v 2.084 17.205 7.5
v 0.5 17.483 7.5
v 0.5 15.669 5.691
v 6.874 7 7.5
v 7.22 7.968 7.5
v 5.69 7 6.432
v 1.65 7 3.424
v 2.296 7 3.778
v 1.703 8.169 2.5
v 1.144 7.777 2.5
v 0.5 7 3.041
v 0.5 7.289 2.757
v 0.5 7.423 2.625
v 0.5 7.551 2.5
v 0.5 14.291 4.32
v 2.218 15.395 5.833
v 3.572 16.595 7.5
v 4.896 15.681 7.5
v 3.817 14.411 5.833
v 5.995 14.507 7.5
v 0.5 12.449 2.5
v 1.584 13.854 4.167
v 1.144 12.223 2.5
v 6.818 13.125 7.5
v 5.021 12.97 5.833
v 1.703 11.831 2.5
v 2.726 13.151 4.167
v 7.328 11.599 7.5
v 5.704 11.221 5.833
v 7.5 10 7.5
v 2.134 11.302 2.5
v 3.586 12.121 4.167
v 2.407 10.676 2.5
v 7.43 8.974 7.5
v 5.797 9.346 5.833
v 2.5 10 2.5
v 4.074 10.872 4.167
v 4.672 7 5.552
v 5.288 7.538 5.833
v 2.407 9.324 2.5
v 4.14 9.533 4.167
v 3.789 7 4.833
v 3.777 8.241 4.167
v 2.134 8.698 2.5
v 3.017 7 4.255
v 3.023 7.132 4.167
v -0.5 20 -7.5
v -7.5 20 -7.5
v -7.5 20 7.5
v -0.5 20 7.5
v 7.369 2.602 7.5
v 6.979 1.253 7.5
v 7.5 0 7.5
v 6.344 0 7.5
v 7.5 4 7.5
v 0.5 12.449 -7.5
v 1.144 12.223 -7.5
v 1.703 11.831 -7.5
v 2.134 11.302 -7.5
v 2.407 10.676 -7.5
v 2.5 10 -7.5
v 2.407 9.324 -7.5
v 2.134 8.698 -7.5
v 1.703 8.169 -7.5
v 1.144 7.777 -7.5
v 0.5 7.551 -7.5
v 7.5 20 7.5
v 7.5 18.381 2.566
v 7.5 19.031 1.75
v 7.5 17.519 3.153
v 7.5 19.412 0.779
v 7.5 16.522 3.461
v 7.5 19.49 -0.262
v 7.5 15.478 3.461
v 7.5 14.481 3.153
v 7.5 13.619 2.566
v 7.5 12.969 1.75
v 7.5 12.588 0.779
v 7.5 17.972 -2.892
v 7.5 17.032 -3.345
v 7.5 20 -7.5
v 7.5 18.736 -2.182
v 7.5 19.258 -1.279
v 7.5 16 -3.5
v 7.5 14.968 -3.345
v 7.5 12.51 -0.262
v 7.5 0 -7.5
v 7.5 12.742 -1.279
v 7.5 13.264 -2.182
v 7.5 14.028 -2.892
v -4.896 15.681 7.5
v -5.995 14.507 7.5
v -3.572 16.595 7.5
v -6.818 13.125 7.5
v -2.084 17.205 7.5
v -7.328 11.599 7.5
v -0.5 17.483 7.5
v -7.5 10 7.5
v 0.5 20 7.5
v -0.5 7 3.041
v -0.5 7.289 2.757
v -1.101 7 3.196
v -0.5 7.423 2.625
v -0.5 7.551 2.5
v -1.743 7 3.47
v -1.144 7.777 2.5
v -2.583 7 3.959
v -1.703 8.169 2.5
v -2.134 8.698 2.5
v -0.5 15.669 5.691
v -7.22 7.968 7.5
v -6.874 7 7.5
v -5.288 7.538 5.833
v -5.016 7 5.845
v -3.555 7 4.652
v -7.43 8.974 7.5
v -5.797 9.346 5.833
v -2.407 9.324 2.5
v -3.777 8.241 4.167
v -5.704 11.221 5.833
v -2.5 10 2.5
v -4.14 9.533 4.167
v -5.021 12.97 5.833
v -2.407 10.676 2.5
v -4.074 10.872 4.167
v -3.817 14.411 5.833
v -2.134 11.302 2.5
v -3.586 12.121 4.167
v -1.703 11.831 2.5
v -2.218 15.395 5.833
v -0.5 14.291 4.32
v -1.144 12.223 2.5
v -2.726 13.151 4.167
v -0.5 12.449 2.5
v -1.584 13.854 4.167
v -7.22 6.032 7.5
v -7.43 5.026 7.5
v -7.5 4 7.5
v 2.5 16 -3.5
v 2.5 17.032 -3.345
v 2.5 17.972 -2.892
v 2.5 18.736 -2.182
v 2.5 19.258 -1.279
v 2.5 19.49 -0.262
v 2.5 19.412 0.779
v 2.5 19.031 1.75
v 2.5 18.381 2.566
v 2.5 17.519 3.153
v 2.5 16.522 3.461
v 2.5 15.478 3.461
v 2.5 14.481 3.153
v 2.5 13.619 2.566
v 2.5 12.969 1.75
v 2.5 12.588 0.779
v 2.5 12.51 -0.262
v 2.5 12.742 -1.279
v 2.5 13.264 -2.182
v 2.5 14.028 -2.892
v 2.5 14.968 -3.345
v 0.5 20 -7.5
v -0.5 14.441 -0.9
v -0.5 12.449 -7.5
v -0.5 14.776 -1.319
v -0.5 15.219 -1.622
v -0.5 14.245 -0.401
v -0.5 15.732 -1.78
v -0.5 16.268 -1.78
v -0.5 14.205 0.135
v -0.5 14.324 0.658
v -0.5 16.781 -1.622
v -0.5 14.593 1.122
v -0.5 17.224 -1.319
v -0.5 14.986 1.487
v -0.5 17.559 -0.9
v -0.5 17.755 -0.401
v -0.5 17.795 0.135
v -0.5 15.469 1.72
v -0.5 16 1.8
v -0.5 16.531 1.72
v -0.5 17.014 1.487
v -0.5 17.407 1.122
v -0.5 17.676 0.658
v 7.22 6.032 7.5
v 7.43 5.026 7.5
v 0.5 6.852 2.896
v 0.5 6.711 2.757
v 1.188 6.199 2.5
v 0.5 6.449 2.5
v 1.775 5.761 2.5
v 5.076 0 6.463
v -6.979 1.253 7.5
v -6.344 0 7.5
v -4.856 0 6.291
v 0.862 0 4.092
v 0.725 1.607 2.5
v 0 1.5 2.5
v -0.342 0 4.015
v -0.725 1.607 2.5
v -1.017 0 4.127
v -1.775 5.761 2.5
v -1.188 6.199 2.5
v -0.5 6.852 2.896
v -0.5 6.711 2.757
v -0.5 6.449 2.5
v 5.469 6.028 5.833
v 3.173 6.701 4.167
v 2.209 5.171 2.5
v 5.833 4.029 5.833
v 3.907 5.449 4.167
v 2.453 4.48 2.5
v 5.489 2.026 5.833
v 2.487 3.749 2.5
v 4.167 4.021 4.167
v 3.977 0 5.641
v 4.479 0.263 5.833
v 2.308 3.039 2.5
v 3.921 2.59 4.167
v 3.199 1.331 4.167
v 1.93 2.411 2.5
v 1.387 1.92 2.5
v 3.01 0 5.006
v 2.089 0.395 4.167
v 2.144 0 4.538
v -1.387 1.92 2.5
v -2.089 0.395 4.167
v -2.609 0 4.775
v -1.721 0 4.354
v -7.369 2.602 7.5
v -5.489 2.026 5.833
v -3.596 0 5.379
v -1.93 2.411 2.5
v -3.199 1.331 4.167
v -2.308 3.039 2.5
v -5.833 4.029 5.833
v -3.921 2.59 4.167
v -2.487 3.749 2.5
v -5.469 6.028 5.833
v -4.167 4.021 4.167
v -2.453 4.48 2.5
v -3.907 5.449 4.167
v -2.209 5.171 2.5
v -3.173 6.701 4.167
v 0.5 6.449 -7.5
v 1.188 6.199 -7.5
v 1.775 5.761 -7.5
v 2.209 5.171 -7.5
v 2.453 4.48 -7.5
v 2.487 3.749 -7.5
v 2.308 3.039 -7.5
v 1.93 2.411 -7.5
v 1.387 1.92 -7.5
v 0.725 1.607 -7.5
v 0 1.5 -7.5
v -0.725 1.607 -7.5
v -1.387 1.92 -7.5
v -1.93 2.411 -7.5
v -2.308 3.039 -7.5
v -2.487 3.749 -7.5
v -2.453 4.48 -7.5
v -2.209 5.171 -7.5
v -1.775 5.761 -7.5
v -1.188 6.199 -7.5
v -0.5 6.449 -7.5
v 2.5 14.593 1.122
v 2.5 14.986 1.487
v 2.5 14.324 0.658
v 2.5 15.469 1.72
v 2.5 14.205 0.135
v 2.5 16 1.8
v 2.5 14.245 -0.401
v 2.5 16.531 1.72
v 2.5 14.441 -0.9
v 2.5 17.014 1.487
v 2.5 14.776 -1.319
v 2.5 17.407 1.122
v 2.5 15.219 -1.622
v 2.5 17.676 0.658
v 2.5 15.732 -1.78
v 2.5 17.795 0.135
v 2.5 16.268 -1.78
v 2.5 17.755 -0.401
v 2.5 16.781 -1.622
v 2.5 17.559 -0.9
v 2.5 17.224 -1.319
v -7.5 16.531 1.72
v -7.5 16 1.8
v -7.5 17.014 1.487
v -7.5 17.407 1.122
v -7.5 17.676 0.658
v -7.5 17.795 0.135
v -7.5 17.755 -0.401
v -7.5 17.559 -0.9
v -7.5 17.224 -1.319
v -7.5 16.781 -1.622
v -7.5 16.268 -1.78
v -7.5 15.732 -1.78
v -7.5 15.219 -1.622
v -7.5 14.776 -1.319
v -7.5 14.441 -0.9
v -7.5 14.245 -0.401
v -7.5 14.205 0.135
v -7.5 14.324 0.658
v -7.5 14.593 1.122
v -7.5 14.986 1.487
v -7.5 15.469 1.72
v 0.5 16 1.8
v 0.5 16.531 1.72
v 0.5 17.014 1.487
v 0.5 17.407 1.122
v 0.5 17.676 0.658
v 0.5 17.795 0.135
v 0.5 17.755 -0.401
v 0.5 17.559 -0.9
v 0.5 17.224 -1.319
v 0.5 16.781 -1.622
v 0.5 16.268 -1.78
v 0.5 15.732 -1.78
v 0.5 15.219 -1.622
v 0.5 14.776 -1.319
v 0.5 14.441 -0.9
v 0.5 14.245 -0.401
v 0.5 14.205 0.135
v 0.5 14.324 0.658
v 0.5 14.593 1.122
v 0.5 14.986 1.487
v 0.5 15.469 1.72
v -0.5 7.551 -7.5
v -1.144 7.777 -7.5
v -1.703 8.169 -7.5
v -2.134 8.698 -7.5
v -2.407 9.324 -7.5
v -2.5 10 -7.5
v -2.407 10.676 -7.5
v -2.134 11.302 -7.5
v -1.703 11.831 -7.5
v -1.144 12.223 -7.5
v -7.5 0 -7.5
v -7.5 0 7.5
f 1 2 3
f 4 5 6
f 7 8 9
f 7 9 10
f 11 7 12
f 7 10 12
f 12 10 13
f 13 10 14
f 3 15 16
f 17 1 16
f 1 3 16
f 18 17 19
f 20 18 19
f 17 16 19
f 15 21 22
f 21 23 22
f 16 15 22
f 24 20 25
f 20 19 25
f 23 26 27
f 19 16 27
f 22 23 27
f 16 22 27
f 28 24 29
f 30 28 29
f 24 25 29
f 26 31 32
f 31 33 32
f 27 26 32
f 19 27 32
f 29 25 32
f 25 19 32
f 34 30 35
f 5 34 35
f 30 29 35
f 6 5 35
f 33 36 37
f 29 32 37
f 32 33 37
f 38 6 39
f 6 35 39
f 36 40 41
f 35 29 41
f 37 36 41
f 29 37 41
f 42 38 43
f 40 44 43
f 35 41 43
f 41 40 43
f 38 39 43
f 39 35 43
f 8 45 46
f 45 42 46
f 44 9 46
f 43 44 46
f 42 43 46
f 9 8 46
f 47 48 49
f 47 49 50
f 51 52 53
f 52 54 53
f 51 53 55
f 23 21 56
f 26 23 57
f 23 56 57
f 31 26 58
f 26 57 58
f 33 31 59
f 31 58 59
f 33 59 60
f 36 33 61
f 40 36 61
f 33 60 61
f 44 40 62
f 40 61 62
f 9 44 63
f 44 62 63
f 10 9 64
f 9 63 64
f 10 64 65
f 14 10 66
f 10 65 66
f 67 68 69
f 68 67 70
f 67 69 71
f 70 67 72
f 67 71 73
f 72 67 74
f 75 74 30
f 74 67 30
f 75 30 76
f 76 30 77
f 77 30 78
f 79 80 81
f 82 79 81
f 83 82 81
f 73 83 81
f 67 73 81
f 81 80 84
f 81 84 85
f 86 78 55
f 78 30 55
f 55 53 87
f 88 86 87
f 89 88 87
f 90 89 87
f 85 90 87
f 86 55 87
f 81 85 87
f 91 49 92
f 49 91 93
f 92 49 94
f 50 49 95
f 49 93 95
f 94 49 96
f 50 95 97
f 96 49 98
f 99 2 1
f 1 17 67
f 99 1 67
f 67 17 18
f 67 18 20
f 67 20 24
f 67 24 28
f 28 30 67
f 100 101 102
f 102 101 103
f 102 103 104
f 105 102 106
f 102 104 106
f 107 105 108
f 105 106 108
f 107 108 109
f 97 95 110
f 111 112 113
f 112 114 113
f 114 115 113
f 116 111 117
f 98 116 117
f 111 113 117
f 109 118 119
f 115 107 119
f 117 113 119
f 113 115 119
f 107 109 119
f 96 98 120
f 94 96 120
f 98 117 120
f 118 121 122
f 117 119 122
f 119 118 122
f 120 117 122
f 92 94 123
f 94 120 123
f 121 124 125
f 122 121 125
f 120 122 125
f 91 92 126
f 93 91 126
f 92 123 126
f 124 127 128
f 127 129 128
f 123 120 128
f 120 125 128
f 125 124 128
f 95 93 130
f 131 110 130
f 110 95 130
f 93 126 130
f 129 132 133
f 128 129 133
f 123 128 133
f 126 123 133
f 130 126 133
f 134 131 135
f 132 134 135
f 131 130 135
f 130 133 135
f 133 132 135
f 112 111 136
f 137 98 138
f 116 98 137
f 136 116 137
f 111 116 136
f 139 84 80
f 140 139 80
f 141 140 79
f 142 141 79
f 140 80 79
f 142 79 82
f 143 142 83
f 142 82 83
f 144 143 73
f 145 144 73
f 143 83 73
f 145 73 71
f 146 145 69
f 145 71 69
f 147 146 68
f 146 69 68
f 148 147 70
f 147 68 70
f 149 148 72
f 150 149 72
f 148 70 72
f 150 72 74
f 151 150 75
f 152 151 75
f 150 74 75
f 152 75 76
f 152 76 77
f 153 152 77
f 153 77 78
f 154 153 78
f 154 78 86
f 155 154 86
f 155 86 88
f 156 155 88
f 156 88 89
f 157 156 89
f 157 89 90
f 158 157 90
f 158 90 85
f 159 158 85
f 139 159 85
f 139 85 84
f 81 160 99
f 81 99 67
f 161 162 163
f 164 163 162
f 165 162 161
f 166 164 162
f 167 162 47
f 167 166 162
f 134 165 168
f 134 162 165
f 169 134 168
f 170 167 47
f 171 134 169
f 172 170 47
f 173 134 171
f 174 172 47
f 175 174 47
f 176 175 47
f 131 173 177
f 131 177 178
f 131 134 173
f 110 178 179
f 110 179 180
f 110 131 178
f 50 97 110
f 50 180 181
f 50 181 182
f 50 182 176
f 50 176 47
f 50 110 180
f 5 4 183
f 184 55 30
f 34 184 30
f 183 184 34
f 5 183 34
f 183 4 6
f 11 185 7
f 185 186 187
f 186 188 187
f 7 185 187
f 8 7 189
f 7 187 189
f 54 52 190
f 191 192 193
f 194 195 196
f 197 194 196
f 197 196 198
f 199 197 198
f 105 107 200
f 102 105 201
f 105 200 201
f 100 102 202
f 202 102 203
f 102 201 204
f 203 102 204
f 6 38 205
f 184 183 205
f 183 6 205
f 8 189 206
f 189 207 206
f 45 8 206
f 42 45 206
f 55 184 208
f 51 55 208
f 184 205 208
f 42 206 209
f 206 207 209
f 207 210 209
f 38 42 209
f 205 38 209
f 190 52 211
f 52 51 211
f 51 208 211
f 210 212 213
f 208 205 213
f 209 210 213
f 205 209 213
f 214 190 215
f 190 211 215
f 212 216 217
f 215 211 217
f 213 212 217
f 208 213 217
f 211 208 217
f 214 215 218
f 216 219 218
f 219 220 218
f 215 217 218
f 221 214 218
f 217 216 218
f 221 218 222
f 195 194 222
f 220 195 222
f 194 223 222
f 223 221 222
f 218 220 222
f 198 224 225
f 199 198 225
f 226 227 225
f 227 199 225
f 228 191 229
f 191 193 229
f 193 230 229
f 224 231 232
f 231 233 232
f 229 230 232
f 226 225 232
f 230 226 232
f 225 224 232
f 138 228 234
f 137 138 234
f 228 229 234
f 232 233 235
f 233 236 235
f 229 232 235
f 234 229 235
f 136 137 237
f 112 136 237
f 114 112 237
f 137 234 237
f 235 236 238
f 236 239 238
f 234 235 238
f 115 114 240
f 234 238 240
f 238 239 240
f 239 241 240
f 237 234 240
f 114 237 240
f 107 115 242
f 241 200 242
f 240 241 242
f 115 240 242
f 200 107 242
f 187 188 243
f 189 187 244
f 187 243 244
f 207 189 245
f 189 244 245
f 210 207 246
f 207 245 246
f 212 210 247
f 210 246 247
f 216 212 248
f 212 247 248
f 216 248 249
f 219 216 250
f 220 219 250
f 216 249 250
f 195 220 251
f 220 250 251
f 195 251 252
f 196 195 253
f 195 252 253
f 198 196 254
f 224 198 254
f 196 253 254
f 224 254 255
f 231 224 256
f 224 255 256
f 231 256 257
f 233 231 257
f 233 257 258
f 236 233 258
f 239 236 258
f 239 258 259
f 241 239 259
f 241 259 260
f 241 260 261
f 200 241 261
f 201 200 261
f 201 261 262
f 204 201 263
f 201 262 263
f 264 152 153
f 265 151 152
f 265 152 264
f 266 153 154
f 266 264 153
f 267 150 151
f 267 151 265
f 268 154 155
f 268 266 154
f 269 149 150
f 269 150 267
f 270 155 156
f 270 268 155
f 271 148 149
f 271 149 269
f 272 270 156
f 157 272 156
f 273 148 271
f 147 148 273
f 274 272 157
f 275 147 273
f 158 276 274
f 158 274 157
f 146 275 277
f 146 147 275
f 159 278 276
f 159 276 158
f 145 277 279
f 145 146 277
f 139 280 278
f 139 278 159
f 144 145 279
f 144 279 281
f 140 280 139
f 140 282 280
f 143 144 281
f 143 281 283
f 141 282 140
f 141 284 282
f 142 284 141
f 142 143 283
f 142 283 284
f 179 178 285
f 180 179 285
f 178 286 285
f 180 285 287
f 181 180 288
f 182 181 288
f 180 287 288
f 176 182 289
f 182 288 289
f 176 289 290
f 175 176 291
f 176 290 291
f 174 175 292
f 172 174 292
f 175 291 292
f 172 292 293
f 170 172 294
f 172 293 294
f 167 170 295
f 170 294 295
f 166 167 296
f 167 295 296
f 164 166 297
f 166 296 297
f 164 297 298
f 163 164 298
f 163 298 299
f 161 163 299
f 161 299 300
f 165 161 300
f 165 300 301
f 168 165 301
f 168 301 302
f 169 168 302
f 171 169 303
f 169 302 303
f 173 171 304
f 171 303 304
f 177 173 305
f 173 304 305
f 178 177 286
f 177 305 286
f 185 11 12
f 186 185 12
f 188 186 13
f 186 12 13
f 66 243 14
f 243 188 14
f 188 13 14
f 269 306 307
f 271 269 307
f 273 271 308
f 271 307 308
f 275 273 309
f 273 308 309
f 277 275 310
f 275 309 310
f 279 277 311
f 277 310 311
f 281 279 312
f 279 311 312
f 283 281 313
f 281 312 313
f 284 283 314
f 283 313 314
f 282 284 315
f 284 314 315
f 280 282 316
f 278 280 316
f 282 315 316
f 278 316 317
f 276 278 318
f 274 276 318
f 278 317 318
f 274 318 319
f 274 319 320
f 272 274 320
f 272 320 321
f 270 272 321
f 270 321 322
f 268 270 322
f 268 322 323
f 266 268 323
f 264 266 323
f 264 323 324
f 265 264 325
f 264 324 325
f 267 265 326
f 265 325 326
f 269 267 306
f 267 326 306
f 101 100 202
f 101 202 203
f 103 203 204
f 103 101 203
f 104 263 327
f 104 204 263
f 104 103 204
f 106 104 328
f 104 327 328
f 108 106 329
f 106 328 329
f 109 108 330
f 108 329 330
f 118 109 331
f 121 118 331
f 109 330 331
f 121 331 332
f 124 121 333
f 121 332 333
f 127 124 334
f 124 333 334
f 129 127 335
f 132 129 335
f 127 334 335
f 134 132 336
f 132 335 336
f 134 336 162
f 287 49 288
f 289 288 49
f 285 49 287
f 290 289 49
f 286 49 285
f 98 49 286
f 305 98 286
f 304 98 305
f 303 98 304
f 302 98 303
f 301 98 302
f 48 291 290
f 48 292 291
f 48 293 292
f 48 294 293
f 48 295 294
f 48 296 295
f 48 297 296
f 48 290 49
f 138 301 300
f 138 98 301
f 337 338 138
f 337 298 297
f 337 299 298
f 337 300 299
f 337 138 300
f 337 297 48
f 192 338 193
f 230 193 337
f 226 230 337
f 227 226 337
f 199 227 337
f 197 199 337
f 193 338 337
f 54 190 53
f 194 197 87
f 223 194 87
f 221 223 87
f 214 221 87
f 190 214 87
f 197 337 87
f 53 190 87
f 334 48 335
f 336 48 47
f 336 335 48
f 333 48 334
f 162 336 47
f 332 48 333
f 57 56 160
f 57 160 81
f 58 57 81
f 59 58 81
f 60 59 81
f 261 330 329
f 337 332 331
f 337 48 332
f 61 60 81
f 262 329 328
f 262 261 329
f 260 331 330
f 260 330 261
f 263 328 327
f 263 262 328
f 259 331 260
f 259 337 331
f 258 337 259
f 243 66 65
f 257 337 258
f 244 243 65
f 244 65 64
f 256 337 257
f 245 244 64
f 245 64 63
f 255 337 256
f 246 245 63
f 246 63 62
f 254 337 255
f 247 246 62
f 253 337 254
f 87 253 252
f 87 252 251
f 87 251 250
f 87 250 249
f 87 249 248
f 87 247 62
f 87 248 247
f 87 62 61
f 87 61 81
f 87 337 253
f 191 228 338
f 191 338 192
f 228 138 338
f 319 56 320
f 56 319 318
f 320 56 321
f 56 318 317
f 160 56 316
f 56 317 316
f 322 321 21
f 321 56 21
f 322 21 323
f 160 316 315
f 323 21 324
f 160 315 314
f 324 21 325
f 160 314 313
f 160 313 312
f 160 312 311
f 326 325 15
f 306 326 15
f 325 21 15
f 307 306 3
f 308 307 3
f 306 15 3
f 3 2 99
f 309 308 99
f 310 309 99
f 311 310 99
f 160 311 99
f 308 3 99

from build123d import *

# Parameters (mm, degrees)
SZKIC1_W                                             = 15
SZKIC1_H                                             = 15
DODANIE_WYCI_GNI_CIE1_DEPTH                          = 20
POG_BIENIE_WALCOWE_POD_M3_WKR_T_DO_CZ_CI_D           = 3.6
POG_BIENIE_WALCOWE_POD_M3_WKR_T_DO_CZ_CI_CBORE_D     = 7
POG_BIENIE_WALCOWE_POD_M3_WKR_T_DO_CZ_CI_CBORE_DEPTH = 5
POG_BIENIE_STO_KOWE_POD_M5_WKR_T_DO_CZ_C_D           = 5
POG_BIENIE_STO_KOWE_POD_M5_WKR_T_DO_CZ_C_CSINK_D     = 15
POG_BIENIE_STO_KOWE_POD_M5_WKR_T_DO_CZ_C_CSINK_ANGLE = 90
SZKIC3_W                                             = 1
SZKIC3_H                                             = 13.577845222
WYTNIJ_WYCI_GNI_CIE1_DEPTH                           = 16


with BuildPart() as part:
    # Szkic1 → Dodanie-wyci_gni_cie1 (new body)
    with BuildSketch(Plane(origin=(0, 0, 0), x_dir=(1, 0, 0), z_dir=(0, 1, 0))):
        Rectangle(SZKIC1_W, SZKIC1_H)
    extrude(amount=DODANIE_WYCI_GNI_CIE1_DEPTH)

    # Pog_bienie walcowe pod M3 wkr_t do cz_ci (through all)
    with Locations(Plane(origin=(7.5, 0, 0), x_dir=(0, 0, -1), z_dir=(1, 0, 0))):
        with Locations((0, 16)):
            CounterBoreHole(POG_BIENIE_WALCOWE_POD_M3_WKR_T_DO_CZ_CI_D / 2, POG_BIENIE_WALCOWE_POD_M3_WKR_T_DO_CZ_CI_CBORE_D / 2, POG_BIENIE_WALCOWE_POD_M3_WKR_T_DO_CZ_CI_CBORE_DEPTH)

    # Pog_bienie sto_kowe pod M5 wkr_t do cz_c (through all)
    with Locations(Plane.XY.offset(7.5)):
        with Locations((0, 10), (0, 4)):
            CounterSinkHole(POG_BIENIE_STO_KOWE_POD_M5_WKR_T_DO_CZ_C_D / 2, POG_BIENIE_STO_KOWE_POD_M5_WKR_T_DO_CZ_C_CSINK_D / 2, counter_sink_angle=POG_BIENIE_STO_KOWE_POD_M5_WKR_T_DO_CZ_C_CSINK_ANGLE)

    # Szkic3 → Wytnij-wyci_gni_cie1 (cut, through all)
    with BuildSketch(Plane.XY.offset(7.5)):
        with Locations((0, 13.211077389)):
            Rectangle(SZKIC3_W, SZKIC3_H)
    extrude(amount=-WYTNIJ_WYCI_GNI_CIE1_DEPTH, mode=Mode.SUBTRACT)


solid = part.part
